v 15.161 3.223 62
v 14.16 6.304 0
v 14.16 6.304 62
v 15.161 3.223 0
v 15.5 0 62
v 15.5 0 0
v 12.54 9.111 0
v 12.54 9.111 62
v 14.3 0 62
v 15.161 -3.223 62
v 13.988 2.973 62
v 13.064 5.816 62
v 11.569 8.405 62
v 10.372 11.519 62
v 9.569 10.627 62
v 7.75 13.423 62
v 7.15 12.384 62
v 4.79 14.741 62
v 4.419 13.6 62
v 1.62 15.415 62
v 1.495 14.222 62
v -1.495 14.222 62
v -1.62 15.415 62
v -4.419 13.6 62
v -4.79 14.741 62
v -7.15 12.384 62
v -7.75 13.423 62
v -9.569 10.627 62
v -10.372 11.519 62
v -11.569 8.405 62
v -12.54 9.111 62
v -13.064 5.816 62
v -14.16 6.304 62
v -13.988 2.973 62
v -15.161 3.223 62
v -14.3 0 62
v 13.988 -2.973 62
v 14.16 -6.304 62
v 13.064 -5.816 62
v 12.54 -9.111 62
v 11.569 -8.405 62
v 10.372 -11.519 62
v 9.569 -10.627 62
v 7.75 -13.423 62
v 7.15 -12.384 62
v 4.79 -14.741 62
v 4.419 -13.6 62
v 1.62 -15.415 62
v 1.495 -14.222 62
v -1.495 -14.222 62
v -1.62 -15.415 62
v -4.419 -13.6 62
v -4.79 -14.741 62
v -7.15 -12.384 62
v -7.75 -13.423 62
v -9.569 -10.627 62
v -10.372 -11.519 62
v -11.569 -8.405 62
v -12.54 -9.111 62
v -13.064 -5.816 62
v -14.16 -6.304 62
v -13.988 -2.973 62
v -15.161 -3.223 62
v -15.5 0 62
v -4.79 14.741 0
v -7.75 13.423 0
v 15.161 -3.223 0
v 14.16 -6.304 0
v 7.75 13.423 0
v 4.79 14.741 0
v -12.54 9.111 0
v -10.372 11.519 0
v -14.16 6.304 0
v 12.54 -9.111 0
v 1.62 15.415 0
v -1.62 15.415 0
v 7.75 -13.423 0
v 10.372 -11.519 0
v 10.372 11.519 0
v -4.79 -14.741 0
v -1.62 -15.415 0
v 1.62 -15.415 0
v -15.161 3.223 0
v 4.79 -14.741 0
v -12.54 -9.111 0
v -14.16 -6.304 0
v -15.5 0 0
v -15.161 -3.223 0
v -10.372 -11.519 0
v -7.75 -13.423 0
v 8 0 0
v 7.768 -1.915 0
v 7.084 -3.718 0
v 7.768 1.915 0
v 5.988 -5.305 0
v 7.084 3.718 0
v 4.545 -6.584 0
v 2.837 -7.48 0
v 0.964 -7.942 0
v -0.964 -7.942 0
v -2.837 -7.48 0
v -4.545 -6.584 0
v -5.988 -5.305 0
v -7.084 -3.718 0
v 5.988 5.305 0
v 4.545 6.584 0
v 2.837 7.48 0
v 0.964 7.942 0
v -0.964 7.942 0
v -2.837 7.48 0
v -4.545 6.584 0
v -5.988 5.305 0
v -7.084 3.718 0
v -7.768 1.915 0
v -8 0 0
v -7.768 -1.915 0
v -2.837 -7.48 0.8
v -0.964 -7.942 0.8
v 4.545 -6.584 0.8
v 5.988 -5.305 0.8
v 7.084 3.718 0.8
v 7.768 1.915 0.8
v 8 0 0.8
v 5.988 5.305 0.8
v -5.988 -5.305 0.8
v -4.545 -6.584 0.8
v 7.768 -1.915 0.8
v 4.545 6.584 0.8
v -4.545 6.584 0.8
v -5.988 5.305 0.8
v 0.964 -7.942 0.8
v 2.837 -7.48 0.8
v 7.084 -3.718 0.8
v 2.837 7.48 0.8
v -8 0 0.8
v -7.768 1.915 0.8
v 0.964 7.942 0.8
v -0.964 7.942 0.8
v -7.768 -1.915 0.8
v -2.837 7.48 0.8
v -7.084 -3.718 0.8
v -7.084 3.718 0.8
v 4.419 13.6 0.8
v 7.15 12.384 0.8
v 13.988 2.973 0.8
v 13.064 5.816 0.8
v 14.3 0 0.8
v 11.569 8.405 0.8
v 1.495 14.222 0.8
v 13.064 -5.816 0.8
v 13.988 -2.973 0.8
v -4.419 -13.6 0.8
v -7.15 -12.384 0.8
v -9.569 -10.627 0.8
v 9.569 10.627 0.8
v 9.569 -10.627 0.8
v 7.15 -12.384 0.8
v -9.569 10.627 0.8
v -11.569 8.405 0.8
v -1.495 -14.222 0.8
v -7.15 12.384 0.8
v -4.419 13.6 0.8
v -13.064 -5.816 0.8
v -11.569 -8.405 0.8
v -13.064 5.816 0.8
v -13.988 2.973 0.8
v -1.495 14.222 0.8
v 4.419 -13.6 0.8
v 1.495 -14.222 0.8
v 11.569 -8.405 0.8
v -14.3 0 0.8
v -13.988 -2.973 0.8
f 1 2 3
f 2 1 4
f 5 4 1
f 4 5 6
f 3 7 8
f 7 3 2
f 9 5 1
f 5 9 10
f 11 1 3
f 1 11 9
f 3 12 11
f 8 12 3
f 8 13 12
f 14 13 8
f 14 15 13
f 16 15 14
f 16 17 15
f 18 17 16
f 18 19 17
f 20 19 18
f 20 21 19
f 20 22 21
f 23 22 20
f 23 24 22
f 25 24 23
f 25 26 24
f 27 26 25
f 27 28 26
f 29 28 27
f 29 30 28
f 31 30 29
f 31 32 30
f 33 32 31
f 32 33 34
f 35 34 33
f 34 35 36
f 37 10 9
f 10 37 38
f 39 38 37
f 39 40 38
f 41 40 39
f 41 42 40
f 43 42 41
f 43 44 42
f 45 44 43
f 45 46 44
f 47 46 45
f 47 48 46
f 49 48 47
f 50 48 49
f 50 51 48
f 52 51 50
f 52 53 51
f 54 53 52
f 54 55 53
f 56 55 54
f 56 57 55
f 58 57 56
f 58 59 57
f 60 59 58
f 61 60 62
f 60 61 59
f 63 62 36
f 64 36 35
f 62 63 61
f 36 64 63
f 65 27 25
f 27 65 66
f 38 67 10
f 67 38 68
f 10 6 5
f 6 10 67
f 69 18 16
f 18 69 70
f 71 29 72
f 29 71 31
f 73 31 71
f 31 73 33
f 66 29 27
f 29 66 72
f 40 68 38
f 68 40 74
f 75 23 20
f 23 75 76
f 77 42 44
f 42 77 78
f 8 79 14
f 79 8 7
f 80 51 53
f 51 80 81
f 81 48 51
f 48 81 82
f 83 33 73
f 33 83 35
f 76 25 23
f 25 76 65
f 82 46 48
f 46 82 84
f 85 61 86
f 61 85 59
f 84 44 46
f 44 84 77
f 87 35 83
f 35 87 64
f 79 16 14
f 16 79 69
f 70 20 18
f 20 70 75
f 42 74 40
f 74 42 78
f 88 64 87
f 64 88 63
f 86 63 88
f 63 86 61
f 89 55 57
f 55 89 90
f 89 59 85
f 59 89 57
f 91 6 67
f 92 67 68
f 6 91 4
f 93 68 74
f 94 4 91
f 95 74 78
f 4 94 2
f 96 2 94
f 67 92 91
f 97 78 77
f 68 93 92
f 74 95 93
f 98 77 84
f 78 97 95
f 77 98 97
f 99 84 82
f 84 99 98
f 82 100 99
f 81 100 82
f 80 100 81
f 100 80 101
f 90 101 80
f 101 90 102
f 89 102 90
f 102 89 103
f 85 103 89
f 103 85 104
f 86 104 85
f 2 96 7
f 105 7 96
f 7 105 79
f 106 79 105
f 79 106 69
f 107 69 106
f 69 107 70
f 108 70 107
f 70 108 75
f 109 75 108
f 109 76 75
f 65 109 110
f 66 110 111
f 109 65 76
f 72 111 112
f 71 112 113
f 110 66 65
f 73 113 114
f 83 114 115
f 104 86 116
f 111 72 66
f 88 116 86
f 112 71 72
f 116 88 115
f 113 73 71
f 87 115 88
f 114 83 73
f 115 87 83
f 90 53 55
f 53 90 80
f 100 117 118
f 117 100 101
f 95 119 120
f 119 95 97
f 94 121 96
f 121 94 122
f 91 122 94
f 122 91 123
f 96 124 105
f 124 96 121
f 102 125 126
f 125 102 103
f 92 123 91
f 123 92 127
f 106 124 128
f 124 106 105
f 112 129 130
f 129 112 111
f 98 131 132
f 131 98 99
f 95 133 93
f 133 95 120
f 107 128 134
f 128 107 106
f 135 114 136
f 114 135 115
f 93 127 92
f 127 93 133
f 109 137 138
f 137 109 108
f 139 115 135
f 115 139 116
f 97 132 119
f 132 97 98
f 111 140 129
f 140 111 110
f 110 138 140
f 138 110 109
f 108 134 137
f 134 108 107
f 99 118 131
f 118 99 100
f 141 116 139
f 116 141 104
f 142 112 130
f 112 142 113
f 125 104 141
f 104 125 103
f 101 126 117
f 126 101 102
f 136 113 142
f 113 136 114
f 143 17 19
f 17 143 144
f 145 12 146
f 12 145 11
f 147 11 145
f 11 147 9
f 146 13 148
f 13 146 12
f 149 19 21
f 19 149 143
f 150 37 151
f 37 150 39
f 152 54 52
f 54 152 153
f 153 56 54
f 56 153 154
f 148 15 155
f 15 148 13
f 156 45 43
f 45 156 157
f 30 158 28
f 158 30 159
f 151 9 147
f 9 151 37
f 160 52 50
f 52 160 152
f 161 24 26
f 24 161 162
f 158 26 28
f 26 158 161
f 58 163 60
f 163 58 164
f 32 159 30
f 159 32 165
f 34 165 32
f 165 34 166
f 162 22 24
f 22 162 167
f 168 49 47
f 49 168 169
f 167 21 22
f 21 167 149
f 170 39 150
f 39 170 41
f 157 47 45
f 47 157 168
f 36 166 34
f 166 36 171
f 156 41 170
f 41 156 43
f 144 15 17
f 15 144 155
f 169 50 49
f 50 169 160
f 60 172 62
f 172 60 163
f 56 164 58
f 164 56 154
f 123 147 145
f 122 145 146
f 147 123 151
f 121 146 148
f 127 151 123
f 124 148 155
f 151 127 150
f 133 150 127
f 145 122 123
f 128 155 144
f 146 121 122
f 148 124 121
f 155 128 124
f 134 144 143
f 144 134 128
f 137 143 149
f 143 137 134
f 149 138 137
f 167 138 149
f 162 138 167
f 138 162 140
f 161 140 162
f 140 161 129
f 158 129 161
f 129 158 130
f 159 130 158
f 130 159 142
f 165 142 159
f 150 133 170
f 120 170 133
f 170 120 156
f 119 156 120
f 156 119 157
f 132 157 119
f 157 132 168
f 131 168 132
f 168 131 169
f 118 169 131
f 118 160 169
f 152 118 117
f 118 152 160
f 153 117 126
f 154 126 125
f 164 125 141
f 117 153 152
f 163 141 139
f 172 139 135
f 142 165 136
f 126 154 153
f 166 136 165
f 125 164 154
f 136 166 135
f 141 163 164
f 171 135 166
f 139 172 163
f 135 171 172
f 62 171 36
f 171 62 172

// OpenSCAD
wall=1.2;
base=0.4*2;
h=62;
od=31;
id=16;
pad=0.1;
padd=pad*2;

difference() {
    cylinder(d=od,h=h);
    translate([0,0,-pad])
    cylinder(d=id,h=h+padd);
    translate([0,0,base])
    cylinder(d=od-wall*2,h=h);
}
